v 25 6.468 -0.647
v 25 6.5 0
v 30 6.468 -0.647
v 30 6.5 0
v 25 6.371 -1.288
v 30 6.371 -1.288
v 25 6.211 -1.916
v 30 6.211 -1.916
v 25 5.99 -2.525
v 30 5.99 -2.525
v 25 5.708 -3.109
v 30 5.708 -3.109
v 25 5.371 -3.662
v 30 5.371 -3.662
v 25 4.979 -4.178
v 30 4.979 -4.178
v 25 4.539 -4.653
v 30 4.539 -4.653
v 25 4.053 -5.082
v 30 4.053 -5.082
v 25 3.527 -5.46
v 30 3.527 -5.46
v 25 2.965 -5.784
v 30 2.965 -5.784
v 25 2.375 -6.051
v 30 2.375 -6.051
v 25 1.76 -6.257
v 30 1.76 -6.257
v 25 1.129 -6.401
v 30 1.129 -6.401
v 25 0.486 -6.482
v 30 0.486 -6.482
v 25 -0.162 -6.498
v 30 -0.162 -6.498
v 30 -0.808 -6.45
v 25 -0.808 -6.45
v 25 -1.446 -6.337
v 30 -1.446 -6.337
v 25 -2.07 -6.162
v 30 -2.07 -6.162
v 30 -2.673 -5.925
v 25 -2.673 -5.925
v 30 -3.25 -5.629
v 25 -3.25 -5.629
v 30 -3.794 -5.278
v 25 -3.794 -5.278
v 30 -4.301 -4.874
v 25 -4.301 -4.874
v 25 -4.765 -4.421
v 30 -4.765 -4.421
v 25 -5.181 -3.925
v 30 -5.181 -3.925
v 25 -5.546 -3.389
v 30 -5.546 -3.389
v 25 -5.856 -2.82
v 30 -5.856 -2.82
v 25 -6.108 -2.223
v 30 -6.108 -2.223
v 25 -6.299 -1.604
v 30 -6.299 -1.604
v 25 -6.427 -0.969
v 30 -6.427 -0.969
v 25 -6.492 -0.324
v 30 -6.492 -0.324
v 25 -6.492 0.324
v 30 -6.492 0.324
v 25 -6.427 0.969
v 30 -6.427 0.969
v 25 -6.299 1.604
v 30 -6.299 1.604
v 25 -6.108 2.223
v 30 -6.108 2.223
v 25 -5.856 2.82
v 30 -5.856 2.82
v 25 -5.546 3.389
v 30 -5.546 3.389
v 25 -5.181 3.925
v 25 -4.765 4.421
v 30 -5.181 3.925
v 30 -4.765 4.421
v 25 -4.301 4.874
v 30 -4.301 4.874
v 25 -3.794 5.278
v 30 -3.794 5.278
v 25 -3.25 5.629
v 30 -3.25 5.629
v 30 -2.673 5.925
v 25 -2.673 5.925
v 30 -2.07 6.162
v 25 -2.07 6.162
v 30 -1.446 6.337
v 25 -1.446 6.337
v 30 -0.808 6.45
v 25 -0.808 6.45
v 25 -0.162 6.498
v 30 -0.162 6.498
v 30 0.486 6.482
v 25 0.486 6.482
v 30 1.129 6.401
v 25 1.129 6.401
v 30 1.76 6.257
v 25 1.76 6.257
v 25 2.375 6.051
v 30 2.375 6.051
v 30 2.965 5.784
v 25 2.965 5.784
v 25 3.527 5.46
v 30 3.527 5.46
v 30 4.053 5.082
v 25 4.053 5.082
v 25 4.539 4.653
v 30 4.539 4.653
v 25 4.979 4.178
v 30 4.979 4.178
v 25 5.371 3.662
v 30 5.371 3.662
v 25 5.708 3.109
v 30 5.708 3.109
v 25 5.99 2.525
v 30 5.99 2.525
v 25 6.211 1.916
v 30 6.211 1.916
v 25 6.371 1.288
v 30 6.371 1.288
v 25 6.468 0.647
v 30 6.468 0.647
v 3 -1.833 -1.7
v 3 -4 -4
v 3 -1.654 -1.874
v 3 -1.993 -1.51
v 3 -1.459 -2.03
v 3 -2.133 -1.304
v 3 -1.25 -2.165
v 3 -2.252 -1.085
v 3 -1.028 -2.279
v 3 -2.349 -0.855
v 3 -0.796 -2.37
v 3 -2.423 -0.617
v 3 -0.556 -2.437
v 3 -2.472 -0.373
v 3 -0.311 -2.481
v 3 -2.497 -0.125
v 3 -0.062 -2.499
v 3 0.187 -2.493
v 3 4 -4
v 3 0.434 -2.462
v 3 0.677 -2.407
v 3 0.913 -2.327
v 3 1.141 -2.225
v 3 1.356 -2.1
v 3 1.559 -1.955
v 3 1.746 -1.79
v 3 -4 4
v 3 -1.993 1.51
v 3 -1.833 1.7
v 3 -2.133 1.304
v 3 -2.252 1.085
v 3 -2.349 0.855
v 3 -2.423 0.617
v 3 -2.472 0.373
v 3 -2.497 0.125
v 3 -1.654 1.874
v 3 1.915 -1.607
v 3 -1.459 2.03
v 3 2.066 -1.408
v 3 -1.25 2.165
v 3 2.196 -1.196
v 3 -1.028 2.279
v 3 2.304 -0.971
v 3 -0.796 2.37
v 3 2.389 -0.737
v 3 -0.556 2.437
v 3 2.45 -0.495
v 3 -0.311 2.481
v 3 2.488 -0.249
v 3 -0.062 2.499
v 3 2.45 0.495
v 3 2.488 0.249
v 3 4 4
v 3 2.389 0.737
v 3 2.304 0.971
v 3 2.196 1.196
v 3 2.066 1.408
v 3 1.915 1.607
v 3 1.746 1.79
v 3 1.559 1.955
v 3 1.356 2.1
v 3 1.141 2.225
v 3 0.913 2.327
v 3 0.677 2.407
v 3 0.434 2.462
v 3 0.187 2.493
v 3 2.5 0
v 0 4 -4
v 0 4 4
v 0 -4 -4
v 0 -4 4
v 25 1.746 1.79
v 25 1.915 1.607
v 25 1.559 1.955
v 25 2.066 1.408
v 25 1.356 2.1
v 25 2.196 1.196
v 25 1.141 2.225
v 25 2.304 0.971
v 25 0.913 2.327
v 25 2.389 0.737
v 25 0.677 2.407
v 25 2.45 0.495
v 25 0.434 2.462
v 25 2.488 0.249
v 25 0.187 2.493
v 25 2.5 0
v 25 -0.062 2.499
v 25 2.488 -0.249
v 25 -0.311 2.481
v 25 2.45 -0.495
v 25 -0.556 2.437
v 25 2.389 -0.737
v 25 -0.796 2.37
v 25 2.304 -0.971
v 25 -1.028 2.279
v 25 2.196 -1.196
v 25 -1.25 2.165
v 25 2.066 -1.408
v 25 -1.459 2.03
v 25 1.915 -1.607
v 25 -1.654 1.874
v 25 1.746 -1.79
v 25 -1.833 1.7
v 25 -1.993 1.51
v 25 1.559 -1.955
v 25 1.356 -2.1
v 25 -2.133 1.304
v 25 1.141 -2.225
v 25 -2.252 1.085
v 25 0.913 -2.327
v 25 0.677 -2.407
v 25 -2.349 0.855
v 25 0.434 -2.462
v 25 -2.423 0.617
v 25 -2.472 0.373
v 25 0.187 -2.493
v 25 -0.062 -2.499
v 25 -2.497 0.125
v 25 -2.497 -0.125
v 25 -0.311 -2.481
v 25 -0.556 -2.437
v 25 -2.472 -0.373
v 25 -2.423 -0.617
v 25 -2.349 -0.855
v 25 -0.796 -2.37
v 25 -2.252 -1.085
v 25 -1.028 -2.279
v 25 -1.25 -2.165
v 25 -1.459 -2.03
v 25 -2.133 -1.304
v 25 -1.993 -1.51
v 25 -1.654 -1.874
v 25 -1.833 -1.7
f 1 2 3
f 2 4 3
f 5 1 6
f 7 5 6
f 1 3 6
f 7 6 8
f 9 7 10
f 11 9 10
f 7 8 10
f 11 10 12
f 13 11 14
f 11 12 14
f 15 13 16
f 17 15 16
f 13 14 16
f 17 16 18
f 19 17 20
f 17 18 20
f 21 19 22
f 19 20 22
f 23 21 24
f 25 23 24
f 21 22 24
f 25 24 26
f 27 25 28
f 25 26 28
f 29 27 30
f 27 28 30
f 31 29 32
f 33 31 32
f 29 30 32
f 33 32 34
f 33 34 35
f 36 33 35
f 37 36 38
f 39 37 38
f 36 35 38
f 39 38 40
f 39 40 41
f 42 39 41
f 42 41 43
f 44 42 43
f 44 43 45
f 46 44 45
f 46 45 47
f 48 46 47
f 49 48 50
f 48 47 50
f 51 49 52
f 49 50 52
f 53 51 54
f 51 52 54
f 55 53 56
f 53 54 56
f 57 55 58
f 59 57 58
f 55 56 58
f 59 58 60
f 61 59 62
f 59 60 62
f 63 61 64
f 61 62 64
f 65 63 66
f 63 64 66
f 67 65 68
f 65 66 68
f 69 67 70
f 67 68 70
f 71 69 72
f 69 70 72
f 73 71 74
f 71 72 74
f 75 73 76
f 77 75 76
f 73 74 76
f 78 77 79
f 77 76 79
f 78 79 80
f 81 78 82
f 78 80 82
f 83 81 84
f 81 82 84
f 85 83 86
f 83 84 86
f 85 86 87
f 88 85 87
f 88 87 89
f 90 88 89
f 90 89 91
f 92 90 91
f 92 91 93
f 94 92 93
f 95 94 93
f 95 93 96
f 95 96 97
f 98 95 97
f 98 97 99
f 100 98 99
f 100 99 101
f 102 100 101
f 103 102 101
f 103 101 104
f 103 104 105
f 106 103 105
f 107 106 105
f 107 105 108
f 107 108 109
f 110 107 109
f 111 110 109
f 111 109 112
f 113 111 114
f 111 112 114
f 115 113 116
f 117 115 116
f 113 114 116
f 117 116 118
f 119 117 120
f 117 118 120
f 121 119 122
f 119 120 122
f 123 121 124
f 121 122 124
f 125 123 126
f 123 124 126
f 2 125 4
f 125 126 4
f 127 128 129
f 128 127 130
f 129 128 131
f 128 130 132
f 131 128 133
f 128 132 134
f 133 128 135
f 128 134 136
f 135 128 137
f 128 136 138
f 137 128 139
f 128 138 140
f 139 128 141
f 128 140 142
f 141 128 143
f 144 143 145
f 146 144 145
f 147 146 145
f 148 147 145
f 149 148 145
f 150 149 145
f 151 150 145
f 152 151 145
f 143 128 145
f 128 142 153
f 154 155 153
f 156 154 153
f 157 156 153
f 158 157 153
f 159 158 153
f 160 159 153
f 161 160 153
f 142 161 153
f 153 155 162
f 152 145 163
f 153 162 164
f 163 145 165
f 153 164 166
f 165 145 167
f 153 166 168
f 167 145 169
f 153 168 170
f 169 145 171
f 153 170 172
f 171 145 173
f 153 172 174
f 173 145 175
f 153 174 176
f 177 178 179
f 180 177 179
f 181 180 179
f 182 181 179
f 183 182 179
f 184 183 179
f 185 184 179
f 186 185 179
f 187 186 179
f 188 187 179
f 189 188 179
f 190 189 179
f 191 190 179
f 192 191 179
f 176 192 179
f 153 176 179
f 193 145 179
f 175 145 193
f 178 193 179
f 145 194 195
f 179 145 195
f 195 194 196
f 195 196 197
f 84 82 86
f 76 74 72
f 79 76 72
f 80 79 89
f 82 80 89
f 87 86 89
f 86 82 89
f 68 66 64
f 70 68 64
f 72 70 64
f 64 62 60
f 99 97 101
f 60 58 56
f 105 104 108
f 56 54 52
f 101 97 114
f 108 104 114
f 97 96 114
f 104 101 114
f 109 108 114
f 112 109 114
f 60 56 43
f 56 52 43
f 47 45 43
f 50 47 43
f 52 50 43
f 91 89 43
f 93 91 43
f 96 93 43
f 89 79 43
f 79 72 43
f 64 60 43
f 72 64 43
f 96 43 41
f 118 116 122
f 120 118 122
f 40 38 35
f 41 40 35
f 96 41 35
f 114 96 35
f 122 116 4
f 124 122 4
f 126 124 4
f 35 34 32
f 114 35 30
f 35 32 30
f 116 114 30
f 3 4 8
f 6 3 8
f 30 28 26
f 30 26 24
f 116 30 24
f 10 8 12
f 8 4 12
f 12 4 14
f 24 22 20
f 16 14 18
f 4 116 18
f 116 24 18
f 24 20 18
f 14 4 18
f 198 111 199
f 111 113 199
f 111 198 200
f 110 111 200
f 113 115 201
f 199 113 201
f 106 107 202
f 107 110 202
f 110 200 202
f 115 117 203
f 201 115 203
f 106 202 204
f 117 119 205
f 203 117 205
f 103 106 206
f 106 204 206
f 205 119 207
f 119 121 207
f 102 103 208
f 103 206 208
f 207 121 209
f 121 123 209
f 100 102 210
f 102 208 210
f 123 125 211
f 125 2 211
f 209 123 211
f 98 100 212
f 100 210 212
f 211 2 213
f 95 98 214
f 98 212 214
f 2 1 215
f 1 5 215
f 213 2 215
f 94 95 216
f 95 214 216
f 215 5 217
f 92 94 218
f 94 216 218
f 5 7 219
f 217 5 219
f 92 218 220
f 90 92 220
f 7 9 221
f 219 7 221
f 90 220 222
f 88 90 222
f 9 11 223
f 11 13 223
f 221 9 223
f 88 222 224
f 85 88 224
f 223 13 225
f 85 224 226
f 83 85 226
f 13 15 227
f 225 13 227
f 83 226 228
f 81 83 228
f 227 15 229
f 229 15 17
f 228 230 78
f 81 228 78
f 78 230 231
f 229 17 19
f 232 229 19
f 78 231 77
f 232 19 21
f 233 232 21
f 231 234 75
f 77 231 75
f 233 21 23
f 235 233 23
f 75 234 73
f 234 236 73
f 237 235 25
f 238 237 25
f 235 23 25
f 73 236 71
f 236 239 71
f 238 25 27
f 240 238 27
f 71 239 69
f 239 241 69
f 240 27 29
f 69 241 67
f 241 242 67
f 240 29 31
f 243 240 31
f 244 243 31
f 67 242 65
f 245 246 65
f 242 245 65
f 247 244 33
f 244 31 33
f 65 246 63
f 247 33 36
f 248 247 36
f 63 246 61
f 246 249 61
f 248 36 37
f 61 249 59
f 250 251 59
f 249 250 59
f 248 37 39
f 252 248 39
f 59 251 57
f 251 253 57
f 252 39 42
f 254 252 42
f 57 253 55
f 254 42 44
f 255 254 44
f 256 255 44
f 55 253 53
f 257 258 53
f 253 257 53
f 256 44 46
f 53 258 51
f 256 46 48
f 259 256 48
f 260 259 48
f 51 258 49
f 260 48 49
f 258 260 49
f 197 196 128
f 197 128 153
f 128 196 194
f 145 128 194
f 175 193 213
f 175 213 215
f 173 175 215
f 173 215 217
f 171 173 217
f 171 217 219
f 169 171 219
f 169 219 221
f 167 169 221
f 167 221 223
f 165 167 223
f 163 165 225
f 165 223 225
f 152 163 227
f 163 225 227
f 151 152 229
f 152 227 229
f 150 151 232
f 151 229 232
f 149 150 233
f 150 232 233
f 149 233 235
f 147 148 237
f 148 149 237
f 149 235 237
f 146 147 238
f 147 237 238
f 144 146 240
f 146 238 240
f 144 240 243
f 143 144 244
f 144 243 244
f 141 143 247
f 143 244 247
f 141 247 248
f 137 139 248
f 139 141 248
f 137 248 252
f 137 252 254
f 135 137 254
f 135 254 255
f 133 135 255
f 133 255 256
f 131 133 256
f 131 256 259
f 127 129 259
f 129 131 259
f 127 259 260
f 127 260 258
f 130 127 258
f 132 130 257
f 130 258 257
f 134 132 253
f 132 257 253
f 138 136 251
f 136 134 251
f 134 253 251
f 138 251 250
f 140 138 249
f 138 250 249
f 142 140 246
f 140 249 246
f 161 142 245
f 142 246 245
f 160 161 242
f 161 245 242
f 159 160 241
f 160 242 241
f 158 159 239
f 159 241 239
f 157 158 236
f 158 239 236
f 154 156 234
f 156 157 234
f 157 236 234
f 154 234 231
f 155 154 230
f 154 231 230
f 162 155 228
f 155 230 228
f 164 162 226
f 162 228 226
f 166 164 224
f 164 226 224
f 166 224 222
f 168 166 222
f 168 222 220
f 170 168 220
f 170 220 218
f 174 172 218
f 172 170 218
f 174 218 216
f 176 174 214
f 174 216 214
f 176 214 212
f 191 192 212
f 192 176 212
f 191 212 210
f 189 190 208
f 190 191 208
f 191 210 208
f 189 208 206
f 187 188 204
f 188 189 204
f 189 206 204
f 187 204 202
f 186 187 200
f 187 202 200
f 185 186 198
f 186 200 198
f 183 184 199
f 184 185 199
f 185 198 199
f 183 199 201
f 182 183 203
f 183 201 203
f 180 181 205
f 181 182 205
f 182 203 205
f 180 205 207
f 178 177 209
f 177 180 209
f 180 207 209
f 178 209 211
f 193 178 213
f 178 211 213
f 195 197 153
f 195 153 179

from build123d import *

# Parameters (mm, degrees)
SKETCH_3_W      = 8
SKETCH_3_H      = 8
EXTRUDE_1_DEPTH = 3


with BuildPart() as part:
    # 草圖1 → 旋轉1 (revolve)
    with BuildSketch(Plane.XY):
        Polygon((0, 0), (0, 2.5), (25, 2.5), (25, 6.5), (30, 6.5), (30, 0), align=None)
    revolve(axis=Axis((30, 0, 0), (-1, 0, 0)))

    # 草圖3 → 填料-伸長1 (add)
    with BuildSketch(Plane.ZY):
        Rectangle(SKETCH_3_W, SKETCH_3_H)
    extrude(amount=-EXTRUDE_1_DEPTH)


solid = part.part
